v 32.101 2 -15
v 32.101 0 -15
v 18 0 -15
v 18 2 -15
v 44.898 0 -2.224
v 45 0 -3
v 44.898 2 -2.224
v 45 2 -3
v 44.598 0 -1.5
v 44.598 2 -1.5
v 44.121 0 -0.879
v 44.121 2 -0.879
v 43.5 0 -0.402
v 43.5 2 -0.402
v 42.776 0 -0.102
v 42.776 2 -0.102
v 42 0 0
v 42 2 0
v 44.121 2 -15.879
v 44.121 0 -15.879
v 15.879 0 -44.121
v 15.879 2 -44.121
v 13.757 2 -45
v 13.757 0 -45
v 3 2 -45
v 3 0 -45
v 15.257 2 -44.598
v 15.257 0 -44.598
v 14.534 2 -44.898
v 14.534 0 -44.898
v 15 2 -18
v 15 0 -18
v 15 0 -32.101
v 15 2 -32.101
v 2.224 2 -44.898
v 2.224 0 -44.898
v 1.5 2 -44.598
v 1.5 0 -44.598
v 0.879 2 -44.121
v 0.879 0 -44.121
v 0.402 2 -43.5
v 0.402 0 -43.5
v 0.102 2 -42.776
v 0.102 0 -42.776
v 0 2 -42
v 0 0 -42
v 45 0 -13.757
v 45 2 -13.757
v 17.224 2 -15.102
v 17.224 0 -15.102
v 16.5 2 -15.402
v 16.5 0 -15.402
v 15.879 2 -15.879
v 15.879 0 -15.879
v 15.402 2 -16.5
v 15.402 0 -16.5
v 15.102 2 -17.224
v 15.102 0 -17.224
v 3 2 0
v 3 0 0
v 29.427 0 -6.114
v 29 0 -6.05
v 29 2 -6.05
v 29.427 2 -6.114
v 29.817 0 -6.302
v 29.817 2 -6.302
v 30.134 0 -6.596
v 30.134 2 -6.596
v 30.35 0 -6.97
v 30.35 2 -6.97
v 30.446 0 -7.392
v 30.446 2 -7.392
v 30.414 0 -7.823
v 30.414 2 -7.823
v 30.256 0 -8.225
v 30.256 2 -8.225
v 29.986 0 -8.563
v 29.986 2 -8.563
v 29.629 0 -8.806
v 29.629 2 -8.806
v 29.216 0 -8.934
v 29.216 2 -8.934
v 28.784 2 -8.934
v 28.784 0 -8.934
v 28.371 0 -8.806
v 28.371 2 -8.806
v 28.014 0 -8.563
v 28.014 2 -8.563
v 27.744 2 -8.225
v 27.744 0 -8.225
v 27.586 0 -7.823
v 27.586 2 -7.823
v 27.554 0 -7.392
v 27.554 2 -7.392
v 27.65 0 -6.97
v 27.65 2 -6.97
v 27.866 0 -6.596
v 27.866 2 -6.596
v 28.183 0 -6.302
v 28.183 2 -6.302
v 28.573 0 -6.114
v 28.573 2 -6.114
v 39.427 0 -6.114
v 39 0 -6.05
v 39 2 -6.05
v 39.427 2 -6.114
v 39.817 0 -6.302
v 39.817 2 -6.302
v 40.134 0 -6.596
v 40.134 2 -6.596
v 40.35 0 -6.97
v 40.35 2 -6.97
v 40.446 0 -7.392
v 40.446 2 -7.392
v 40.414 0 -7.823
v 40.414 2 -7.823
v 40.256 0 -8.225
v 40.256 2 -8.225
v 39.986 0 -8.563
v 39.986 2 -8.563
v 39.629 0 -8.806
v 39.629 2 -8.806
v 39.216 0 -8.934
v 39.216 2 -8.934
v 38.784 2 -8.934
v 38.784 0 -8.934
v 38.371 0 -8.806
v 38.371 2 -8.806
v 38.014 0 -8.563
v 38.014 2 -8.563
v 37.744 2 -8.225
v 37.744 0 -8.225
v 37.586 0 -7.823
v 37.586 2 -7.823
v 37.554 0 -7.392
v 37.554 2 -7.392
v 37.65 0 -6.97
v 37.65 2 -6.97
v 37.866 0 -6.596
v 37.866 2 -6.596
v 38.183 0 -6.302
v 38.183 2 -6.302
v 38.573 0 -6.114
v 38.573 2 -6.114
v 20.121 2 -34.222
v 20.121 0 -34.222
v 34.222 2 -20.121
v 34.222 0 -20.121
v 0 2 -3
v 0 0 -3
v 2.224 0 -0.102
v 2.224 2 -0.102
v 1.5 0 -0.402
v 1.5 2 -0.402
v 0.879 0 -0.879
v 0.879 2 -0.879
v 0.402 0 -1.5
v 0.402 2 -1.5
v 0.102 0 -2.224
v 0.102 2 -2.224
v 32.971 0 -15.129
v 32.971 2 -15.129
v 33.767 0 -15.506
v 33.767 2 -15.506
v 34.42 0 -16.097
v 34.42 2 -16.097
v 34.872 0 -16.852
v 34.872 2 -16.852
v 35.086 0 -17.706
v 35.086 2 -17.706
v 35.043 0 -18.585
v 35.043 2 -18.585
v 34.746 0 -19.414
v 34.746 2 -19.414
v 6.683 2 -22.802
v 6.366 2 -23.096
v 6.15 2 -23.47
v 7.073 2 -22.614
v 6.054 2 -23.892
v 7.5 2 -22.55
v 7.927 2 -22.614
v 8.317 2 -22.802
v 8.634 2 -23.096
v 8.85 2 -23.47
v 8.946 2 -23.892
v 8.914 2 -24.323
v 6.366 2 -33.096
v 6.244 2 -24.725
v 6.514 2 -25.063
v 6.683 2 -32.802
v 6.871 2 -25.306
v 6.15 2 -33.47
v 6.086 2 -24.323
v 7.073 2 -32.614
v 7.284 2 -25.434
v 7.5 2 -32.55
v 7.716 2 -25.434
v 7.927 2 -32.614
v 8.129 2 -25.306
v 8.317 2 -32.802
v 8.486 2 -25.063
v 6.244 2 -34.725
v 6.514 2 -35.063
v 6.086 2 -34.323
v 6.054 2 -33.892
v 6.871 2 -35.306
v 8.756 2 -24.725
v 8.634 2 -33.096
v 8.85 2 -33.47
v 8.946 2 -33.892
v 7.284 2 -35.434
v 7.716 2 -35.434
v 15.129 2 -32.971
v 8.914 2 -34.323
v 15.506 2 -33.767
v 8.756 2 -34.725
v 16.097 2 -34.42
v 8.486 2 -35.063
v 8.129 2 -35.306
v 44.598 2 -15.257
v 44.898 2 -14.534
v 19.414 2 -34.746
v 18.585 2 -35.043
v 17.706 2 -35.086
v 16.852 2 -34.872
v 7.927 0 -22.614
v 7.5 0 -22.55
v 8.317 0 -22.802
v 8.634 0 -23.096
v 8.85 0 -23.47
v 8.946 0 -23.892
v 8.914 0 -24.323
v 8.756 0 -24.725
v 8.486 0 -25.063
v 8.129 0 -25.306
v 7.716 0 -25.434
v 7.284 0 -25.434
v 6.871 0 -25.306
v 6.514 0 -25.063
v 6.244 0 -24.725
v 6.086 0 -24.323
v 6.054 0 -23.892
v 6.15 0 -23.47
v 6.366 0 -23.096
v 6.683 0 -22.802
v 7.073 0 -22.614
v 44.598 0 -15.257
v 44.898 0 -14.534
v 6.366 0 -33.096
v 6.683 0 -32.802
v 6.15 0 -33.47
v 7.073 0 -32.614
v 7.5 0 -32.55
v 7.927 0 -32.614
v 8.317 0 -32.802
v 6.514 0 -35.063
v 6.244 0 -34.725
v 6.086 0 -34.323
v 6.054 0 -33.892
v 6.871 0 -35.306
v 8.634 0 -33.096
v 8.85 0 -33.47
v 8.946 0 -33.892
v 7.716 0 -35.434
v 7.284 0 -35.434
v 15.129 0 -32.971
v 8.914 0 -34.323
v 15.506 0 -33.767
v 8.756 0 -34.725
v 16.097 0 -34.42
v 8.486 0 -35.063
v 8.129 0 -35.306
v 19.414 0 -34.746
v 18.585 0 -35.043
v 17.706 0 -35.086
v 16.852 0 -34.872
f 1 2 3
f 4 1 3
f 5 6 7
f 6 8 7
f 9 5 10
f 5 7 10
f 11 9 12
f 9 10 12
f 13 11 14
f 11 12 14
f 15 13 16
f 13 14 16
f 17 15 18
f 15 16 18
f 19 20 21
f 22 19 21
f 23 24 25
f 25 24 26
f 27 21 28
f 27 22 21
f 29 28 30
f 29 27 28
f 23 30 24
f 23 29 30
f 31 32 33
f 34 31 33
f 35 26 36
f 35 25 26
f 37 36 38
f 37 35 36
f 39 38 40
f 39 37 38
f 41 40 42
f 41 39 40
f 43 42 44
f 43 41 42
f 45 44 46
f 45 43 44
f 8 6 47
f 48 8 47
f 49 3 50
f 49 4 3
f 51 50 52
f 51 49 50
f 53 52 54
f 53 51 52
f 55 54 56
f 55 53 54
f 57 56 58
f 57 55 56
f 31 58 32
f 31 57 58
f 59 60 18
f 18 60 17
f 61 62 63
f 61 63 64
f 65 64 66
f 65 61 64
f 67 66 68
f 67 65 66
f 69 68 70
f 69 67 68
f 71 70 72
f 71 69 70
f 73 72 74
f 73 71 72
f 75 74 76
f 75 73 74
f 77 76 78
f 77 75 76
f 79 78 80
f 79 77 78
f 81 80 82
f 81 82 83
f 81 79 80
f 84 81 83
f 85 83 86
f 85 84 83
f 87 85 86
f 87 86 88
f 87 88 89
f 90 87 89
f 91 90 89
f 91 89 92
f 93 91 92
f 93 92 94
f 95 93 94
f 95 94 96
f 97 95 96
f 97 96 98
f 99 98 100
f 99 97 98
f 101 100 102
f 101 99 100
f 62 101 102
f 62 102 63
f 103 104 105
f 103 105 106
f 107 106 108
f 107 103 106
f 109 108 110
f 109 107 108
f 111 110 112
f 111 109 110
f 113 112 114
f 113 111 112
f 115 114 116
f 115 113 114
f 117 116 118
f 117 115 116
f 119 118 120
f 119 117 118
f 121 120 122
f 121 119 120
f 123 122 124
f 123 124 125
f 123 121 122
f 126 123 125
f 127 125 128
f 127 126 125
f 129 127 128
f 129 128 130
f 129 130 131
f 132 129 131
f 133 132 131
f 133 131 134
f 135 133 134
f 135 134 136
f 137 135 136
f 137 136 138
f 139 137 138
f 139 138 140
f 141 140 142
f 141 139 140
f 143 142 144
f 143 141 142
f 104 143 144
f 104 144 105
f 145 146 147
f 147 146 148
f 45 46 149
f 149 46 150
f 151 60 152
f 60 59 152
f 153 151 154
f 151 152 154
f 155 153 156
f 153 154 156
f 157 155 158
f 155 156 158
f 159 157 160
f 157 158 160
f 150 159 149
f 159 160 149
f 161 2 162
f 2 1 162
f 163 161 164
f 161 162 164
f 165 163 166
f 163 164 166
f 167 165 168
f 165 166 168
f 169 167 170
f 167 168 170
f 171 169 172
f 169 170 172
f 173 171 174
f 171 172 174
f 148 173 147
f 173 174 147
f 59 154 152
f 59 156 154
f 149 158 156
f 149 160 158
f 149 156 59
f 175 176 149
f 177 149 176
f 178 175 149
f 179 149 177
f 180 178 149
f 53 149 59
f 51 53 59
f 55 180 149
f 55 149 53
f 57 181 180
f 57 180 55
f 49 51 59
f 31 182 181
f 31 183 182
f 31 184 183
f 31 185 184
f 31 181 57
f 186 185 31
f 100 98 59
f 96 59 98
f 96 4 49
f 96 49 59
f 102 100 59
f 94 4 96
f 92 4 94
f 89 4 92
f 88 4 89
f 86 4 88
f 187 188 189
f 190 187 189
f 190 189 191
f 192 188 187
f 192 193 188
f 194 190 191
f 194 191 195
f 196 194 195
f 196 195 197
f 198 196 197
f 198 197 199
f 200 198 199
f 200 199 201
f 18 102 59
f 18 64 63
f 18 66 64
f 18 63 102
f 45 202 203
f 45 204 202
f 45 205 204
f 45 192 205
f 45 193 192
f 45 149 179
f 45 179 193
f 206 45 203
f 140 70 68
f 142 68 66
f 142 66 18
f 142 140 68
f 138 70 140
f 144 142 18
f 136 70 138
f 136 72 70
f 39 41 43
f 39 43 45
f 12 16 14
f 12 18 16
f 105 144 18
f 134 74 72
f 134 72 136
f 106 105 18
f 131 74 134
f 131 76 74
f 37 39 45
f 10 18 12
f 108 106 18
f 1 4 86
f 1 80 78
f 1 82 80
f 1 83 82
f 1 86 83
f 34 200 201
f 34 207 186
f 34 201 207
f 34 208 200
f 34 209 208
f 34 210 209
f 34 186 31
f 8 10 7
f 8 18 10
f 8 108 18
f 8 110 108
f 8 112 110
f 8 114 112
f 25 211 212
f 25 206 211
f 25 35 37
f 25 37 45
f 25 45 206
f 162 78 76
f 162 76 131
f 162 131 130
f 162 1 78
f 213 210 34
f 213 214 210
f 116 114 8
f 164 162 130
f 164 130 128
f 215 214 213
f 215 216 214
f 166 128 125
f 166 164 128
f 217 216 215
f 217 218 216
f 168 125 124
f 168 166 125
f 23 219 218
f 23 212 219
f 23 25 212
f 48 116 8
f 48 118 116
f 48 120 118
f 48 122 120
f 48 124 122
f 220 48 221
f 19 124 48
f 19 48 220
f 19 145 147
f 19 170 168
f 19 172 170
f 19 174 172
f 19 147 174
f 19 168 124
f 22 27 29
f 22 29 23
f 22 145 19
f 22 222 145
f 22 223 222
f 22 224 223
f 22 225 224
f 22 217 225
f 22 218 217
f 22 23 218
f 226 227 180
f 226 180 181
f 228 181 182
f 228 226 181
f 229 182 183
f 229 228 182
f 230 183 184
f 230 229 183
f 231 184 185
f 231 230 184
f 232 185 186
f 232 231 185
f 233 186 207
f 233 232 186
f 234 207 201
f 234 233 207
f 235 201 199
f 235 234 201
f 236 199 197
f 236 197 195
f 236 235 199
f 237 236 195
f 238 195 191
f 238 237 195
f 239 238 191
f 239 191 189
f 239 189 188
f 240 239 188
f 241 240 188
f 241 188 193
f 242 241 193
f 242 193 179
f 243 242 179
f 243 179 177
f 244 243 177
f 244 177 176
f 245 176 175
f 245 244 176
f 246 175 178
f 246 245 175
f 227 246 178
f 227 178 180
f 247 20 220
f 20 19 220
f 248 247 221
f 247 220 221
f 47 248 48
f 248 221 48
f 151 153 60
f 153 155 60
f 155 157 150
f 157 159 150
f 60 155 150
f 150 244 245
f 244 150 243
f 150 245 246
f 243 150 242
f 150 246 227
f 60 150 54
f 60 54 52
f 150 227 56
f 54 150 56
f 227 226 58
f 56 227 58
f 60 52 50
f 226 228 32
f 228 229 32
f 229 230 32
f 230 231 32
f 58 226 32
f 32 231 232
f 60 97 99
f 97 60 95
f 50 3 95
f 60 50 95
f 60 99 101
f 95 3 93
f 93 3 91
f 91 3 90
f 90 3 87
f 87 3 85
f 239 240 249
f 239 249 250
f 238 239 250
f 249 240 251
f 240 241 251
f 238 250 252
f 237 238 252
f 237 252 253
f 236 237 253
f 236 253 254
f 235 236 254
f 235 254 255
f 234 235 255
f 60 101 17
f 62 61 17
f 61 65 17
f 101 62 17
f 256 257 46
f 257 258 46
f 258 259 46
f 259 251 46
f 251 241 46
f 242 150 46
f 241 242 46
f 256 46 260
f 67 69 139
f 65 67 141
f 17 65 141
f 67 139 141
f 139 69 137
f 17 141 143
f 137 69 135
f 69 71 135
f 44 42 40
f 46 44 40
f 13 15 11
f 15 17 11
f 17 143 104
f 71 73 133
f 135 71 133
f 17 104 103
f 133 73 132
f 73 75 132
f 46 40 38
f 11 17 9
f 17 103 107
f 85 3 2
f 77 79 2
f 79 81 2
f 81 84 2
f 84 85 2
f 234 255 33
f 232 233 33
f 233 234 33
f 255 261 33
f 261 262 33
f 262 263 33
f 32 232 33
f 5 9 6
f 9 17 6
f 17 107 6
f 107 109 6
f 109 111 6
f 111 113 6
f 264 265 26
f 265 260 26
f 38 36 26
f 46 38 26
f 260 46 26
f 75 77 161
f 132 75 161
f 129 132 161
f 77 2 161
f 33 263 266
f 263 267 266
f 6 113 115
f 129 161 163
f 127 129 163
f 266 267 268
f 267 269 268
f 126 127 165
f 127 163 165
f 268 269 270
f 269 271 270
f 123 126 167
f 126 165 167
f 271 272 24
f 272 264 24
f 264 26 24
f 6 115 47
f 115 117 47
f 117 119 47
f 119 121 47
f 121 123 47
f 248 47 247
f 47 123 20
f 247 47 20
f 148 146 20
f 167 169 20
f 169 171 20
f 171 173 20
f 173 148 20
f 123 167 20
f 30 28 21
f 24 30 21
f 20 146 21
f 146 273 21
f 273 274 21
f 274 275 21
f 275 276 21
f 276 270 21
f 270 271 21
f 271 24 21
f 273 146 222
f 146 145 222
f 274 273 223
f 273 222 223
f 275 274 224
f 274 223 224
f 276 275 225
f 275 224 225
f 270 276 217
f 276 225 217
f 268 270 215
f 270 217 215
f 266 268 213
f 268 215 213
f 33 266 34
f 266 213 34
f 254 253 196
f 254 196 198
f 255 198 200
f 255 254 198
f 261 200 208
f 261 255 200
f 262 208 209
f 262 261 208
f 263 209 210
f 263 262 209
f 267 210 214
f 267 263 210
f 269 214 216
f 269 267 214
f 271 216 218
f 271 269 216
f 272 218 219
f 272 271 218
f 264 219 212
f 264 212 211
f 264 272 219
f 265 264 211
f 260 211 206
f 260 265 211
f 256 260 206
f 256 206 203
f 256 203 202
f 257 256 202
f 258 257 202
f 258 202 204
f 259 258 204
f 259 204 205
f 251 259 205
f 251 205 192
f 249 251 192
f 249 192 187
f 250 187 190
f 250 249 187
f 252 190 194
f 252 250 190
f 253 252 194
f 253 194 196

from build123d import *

# Parameters (mm, degrees)
SKETCH_1_R      = 1.45
EXTRUDE_1_DEPTH = 2
FILLET_1_R      = 3


with BuildPart() as part:
    # 草图1 → 凸台-拉伸1 (new body)
    with BuildSketch(Plane(origin=(0, 0, 0), x_dir=(1, 0, 0), z_dir=(0, 1, 0))):
        Polygon((45, 15), (15, 45), (0, 45), (0, 15), (0, 0), (15, 0), (45, 0), align=None)
        with Locations(Location((29, 7.5, 0), (0, 0, 270))):
            Circle(SKETCH_1_R, mode=Mode.SUBTRACT)
        with Locations(Location((39, 7.5, 0), (0, 0, 270))):
            Circle(SKETCH_1_R, mode=Mode.SUBTRACT)
        with Locations(Location((7.5, 24, 0), (0, 0, 270))):
            Circle(SKETCH_1_R, mode=Mode.SUBTRACT)
        with Locations(Location((7.5, 34, 0), (0, 0, 270))):
            Circle(SKETCH_1_R, mode=Mode.SUBTRACT)
        Polygon((15, 15), (15, 39.343145751), (39.343145751, 15), align=None, mode=Mode.SUBTRACT)
    extrude(amount=EXTRUDE_1_DEPTH)

    # 圆角1
    fillet_1_edges = [part.edges().sort_by_distance(p)[0] for p in [
        (15, 1, -45),
        (45, 1, -15),
        (45, 1, 0),
        (0, 1, 0),
        (0, 1, -45),
        (15, 1, -39.343145751),
        (15, 1, -15),
        (39.343145751, 1, -15),
    ]]
    fillet(fillet_1_edges, radius=FILLET_1_R)


solid = part.part
